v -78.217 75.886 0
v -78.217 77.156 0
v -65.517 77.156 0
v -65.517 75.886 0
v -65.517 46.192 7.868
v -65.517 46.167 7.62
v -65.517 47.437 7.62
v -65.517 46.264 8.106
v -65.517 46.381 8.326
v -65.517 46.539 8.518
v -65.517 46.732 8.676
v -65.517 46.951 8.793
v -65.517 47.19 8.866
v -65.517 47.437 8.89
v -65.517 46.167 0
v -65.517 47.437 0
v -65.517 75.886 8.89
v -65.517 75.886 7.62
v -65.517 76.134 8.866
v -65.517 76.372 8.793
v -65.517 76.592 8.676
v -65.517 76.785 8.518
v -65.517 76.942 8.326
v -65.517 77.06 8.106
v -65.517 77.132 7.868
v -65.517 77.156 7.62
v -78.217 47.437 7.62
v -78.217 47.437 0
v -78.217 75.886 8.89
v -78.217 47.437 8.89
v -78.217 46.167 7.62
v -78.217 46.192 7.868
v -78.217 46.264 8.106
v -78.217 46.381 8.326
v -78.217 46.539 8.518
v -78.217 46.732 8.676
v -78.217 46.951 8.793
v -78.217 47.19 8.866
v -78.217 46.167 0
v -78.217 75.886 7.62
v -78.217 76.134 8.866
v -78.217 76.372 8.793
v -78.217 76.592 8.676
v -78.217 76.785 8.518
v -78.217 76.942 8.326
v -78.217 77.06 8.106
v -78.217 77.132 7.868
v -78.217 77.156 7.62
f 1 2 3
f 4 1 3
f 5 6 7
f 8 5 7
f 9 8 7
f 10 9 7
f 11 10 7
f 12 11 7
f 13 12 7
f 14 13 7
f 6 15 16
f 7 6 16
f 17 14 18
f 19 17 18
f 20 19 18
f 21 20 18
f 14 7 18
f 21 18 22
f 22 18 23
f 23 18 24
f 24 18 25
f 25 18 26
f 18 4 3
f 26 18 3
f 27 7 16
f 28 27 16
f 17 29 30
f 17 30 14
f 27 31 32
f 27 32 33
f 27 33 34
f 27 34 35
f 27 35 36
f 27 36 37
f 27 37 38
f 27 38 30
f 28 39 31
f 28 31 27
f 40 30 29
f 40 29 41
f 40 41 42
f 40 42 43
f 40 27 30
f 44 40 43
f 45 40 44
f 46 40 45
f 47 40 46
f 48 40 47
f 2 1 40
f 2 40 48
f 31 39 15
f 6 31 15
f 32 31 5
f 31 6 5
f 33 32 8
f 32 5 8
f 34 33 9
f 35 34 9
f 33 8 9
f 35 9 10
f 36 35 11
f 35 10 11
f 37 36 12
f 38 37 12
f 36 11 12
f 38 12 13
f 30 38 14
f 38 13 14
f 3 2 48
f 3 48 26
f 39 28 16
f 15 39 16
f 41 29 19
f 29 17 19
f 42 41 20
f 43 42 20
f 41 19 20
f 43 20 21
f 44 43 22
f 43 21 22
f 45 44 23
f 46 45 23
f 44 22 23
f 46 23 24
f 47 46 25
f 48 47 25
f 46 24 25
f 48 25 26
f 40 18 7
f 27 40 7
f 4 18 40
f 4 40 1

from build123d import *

# Parameters (mm, degrees)
F0_W     = 78.2169550657
F0_H     = 84.6516340971
F1_DEPTH = 8.89
F2_DEPTH = 53.66258
F3_DEPTH = 65.51676
F4_T     = -1.27
F5_DEPTH = 25.4
F6_DEPTH = 25.4
F7_R     = 1.27


with BuildPart() as f1:
    # F0 (on Top) → F1 (new body)
    with BuildSketch(Plane.XY):
        with Locations((-39.1084775329, 34.8306708038)):
            Rectangle(F0_W, F0_H)
    extrude(amount=F1_DEPTH)

    # F2 (cut): a face of the model
    f2_faces = [f1.faces().sort_by_distance(p)[0] for p in [
        (-39.1084775329, -7.4951462448, 4.445),
    ]]
    extrude(f2_faces, amount=-F2_DEPTH, mode=Mode.SUBTRACT)

    # F3 (cut): a face of the model
    f3_faces = [f1.faces().sort_by_distance(p)[0] for p in [
        (0, 61.6619608038, 4.445),
    ]]
    extrude(f3_faces, amount=-F3_DEPTH, mode=Mode.SUBTRACT)

    # F4
    f4_openings = [f1.faces().sort_by_distance(p)[0] for p in [
        (-65.51676, 61.661961, 4.445),
    ]]
    offset(amount=F4_T, openings=f4_openings)

    # F5 (cut): a face of the model
    f5_faces = [f1.faces().sort_by_distance(p)[0] for p in [
        (-71.2318575329, 61.6619608038, 1.27),
    ]]
    extrude(f5_faces, amount=-F5_DEPTH, mode=Mode.SUBTRACT)

    # F6 (cut): a face of the model
    f6_faces = [f1.faces().sort_by_distance(p)[0] for p in [
        (-76.9469550657, 61.6619608038, 3.81),
    ]]
    extrude(f6_faces, amount=-F6_DEPTH, mode=Mode.SUBTRACT)

    # F7
    f7_edges = [f1.edges().sort_by_distance(p)[0] for p in [
        (-71.866858, 46.167434, 8.89),
        (-71.866858, 77.156488, 8.89),
    ]]
    fillet(f7_edges, radius=F7_R)


solid = f1.part
